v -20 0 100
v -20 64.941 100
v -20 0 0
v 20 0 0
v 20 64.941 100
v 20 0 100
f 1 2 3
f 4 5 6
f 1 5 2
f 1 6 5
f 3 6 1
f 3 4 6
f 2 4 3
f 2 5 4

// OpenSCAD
translate([-20.0,0.0,100.0])scale([1.0,1.0,1.0])rotate([0.0,0.0,0.0])  rotate([90.0,90.0,90.0])  linear_extrude(height =40.0)  polygon(
points = [[0.0,0.0],[100.0,0.0],[0.0,64.94075931975104]]);
